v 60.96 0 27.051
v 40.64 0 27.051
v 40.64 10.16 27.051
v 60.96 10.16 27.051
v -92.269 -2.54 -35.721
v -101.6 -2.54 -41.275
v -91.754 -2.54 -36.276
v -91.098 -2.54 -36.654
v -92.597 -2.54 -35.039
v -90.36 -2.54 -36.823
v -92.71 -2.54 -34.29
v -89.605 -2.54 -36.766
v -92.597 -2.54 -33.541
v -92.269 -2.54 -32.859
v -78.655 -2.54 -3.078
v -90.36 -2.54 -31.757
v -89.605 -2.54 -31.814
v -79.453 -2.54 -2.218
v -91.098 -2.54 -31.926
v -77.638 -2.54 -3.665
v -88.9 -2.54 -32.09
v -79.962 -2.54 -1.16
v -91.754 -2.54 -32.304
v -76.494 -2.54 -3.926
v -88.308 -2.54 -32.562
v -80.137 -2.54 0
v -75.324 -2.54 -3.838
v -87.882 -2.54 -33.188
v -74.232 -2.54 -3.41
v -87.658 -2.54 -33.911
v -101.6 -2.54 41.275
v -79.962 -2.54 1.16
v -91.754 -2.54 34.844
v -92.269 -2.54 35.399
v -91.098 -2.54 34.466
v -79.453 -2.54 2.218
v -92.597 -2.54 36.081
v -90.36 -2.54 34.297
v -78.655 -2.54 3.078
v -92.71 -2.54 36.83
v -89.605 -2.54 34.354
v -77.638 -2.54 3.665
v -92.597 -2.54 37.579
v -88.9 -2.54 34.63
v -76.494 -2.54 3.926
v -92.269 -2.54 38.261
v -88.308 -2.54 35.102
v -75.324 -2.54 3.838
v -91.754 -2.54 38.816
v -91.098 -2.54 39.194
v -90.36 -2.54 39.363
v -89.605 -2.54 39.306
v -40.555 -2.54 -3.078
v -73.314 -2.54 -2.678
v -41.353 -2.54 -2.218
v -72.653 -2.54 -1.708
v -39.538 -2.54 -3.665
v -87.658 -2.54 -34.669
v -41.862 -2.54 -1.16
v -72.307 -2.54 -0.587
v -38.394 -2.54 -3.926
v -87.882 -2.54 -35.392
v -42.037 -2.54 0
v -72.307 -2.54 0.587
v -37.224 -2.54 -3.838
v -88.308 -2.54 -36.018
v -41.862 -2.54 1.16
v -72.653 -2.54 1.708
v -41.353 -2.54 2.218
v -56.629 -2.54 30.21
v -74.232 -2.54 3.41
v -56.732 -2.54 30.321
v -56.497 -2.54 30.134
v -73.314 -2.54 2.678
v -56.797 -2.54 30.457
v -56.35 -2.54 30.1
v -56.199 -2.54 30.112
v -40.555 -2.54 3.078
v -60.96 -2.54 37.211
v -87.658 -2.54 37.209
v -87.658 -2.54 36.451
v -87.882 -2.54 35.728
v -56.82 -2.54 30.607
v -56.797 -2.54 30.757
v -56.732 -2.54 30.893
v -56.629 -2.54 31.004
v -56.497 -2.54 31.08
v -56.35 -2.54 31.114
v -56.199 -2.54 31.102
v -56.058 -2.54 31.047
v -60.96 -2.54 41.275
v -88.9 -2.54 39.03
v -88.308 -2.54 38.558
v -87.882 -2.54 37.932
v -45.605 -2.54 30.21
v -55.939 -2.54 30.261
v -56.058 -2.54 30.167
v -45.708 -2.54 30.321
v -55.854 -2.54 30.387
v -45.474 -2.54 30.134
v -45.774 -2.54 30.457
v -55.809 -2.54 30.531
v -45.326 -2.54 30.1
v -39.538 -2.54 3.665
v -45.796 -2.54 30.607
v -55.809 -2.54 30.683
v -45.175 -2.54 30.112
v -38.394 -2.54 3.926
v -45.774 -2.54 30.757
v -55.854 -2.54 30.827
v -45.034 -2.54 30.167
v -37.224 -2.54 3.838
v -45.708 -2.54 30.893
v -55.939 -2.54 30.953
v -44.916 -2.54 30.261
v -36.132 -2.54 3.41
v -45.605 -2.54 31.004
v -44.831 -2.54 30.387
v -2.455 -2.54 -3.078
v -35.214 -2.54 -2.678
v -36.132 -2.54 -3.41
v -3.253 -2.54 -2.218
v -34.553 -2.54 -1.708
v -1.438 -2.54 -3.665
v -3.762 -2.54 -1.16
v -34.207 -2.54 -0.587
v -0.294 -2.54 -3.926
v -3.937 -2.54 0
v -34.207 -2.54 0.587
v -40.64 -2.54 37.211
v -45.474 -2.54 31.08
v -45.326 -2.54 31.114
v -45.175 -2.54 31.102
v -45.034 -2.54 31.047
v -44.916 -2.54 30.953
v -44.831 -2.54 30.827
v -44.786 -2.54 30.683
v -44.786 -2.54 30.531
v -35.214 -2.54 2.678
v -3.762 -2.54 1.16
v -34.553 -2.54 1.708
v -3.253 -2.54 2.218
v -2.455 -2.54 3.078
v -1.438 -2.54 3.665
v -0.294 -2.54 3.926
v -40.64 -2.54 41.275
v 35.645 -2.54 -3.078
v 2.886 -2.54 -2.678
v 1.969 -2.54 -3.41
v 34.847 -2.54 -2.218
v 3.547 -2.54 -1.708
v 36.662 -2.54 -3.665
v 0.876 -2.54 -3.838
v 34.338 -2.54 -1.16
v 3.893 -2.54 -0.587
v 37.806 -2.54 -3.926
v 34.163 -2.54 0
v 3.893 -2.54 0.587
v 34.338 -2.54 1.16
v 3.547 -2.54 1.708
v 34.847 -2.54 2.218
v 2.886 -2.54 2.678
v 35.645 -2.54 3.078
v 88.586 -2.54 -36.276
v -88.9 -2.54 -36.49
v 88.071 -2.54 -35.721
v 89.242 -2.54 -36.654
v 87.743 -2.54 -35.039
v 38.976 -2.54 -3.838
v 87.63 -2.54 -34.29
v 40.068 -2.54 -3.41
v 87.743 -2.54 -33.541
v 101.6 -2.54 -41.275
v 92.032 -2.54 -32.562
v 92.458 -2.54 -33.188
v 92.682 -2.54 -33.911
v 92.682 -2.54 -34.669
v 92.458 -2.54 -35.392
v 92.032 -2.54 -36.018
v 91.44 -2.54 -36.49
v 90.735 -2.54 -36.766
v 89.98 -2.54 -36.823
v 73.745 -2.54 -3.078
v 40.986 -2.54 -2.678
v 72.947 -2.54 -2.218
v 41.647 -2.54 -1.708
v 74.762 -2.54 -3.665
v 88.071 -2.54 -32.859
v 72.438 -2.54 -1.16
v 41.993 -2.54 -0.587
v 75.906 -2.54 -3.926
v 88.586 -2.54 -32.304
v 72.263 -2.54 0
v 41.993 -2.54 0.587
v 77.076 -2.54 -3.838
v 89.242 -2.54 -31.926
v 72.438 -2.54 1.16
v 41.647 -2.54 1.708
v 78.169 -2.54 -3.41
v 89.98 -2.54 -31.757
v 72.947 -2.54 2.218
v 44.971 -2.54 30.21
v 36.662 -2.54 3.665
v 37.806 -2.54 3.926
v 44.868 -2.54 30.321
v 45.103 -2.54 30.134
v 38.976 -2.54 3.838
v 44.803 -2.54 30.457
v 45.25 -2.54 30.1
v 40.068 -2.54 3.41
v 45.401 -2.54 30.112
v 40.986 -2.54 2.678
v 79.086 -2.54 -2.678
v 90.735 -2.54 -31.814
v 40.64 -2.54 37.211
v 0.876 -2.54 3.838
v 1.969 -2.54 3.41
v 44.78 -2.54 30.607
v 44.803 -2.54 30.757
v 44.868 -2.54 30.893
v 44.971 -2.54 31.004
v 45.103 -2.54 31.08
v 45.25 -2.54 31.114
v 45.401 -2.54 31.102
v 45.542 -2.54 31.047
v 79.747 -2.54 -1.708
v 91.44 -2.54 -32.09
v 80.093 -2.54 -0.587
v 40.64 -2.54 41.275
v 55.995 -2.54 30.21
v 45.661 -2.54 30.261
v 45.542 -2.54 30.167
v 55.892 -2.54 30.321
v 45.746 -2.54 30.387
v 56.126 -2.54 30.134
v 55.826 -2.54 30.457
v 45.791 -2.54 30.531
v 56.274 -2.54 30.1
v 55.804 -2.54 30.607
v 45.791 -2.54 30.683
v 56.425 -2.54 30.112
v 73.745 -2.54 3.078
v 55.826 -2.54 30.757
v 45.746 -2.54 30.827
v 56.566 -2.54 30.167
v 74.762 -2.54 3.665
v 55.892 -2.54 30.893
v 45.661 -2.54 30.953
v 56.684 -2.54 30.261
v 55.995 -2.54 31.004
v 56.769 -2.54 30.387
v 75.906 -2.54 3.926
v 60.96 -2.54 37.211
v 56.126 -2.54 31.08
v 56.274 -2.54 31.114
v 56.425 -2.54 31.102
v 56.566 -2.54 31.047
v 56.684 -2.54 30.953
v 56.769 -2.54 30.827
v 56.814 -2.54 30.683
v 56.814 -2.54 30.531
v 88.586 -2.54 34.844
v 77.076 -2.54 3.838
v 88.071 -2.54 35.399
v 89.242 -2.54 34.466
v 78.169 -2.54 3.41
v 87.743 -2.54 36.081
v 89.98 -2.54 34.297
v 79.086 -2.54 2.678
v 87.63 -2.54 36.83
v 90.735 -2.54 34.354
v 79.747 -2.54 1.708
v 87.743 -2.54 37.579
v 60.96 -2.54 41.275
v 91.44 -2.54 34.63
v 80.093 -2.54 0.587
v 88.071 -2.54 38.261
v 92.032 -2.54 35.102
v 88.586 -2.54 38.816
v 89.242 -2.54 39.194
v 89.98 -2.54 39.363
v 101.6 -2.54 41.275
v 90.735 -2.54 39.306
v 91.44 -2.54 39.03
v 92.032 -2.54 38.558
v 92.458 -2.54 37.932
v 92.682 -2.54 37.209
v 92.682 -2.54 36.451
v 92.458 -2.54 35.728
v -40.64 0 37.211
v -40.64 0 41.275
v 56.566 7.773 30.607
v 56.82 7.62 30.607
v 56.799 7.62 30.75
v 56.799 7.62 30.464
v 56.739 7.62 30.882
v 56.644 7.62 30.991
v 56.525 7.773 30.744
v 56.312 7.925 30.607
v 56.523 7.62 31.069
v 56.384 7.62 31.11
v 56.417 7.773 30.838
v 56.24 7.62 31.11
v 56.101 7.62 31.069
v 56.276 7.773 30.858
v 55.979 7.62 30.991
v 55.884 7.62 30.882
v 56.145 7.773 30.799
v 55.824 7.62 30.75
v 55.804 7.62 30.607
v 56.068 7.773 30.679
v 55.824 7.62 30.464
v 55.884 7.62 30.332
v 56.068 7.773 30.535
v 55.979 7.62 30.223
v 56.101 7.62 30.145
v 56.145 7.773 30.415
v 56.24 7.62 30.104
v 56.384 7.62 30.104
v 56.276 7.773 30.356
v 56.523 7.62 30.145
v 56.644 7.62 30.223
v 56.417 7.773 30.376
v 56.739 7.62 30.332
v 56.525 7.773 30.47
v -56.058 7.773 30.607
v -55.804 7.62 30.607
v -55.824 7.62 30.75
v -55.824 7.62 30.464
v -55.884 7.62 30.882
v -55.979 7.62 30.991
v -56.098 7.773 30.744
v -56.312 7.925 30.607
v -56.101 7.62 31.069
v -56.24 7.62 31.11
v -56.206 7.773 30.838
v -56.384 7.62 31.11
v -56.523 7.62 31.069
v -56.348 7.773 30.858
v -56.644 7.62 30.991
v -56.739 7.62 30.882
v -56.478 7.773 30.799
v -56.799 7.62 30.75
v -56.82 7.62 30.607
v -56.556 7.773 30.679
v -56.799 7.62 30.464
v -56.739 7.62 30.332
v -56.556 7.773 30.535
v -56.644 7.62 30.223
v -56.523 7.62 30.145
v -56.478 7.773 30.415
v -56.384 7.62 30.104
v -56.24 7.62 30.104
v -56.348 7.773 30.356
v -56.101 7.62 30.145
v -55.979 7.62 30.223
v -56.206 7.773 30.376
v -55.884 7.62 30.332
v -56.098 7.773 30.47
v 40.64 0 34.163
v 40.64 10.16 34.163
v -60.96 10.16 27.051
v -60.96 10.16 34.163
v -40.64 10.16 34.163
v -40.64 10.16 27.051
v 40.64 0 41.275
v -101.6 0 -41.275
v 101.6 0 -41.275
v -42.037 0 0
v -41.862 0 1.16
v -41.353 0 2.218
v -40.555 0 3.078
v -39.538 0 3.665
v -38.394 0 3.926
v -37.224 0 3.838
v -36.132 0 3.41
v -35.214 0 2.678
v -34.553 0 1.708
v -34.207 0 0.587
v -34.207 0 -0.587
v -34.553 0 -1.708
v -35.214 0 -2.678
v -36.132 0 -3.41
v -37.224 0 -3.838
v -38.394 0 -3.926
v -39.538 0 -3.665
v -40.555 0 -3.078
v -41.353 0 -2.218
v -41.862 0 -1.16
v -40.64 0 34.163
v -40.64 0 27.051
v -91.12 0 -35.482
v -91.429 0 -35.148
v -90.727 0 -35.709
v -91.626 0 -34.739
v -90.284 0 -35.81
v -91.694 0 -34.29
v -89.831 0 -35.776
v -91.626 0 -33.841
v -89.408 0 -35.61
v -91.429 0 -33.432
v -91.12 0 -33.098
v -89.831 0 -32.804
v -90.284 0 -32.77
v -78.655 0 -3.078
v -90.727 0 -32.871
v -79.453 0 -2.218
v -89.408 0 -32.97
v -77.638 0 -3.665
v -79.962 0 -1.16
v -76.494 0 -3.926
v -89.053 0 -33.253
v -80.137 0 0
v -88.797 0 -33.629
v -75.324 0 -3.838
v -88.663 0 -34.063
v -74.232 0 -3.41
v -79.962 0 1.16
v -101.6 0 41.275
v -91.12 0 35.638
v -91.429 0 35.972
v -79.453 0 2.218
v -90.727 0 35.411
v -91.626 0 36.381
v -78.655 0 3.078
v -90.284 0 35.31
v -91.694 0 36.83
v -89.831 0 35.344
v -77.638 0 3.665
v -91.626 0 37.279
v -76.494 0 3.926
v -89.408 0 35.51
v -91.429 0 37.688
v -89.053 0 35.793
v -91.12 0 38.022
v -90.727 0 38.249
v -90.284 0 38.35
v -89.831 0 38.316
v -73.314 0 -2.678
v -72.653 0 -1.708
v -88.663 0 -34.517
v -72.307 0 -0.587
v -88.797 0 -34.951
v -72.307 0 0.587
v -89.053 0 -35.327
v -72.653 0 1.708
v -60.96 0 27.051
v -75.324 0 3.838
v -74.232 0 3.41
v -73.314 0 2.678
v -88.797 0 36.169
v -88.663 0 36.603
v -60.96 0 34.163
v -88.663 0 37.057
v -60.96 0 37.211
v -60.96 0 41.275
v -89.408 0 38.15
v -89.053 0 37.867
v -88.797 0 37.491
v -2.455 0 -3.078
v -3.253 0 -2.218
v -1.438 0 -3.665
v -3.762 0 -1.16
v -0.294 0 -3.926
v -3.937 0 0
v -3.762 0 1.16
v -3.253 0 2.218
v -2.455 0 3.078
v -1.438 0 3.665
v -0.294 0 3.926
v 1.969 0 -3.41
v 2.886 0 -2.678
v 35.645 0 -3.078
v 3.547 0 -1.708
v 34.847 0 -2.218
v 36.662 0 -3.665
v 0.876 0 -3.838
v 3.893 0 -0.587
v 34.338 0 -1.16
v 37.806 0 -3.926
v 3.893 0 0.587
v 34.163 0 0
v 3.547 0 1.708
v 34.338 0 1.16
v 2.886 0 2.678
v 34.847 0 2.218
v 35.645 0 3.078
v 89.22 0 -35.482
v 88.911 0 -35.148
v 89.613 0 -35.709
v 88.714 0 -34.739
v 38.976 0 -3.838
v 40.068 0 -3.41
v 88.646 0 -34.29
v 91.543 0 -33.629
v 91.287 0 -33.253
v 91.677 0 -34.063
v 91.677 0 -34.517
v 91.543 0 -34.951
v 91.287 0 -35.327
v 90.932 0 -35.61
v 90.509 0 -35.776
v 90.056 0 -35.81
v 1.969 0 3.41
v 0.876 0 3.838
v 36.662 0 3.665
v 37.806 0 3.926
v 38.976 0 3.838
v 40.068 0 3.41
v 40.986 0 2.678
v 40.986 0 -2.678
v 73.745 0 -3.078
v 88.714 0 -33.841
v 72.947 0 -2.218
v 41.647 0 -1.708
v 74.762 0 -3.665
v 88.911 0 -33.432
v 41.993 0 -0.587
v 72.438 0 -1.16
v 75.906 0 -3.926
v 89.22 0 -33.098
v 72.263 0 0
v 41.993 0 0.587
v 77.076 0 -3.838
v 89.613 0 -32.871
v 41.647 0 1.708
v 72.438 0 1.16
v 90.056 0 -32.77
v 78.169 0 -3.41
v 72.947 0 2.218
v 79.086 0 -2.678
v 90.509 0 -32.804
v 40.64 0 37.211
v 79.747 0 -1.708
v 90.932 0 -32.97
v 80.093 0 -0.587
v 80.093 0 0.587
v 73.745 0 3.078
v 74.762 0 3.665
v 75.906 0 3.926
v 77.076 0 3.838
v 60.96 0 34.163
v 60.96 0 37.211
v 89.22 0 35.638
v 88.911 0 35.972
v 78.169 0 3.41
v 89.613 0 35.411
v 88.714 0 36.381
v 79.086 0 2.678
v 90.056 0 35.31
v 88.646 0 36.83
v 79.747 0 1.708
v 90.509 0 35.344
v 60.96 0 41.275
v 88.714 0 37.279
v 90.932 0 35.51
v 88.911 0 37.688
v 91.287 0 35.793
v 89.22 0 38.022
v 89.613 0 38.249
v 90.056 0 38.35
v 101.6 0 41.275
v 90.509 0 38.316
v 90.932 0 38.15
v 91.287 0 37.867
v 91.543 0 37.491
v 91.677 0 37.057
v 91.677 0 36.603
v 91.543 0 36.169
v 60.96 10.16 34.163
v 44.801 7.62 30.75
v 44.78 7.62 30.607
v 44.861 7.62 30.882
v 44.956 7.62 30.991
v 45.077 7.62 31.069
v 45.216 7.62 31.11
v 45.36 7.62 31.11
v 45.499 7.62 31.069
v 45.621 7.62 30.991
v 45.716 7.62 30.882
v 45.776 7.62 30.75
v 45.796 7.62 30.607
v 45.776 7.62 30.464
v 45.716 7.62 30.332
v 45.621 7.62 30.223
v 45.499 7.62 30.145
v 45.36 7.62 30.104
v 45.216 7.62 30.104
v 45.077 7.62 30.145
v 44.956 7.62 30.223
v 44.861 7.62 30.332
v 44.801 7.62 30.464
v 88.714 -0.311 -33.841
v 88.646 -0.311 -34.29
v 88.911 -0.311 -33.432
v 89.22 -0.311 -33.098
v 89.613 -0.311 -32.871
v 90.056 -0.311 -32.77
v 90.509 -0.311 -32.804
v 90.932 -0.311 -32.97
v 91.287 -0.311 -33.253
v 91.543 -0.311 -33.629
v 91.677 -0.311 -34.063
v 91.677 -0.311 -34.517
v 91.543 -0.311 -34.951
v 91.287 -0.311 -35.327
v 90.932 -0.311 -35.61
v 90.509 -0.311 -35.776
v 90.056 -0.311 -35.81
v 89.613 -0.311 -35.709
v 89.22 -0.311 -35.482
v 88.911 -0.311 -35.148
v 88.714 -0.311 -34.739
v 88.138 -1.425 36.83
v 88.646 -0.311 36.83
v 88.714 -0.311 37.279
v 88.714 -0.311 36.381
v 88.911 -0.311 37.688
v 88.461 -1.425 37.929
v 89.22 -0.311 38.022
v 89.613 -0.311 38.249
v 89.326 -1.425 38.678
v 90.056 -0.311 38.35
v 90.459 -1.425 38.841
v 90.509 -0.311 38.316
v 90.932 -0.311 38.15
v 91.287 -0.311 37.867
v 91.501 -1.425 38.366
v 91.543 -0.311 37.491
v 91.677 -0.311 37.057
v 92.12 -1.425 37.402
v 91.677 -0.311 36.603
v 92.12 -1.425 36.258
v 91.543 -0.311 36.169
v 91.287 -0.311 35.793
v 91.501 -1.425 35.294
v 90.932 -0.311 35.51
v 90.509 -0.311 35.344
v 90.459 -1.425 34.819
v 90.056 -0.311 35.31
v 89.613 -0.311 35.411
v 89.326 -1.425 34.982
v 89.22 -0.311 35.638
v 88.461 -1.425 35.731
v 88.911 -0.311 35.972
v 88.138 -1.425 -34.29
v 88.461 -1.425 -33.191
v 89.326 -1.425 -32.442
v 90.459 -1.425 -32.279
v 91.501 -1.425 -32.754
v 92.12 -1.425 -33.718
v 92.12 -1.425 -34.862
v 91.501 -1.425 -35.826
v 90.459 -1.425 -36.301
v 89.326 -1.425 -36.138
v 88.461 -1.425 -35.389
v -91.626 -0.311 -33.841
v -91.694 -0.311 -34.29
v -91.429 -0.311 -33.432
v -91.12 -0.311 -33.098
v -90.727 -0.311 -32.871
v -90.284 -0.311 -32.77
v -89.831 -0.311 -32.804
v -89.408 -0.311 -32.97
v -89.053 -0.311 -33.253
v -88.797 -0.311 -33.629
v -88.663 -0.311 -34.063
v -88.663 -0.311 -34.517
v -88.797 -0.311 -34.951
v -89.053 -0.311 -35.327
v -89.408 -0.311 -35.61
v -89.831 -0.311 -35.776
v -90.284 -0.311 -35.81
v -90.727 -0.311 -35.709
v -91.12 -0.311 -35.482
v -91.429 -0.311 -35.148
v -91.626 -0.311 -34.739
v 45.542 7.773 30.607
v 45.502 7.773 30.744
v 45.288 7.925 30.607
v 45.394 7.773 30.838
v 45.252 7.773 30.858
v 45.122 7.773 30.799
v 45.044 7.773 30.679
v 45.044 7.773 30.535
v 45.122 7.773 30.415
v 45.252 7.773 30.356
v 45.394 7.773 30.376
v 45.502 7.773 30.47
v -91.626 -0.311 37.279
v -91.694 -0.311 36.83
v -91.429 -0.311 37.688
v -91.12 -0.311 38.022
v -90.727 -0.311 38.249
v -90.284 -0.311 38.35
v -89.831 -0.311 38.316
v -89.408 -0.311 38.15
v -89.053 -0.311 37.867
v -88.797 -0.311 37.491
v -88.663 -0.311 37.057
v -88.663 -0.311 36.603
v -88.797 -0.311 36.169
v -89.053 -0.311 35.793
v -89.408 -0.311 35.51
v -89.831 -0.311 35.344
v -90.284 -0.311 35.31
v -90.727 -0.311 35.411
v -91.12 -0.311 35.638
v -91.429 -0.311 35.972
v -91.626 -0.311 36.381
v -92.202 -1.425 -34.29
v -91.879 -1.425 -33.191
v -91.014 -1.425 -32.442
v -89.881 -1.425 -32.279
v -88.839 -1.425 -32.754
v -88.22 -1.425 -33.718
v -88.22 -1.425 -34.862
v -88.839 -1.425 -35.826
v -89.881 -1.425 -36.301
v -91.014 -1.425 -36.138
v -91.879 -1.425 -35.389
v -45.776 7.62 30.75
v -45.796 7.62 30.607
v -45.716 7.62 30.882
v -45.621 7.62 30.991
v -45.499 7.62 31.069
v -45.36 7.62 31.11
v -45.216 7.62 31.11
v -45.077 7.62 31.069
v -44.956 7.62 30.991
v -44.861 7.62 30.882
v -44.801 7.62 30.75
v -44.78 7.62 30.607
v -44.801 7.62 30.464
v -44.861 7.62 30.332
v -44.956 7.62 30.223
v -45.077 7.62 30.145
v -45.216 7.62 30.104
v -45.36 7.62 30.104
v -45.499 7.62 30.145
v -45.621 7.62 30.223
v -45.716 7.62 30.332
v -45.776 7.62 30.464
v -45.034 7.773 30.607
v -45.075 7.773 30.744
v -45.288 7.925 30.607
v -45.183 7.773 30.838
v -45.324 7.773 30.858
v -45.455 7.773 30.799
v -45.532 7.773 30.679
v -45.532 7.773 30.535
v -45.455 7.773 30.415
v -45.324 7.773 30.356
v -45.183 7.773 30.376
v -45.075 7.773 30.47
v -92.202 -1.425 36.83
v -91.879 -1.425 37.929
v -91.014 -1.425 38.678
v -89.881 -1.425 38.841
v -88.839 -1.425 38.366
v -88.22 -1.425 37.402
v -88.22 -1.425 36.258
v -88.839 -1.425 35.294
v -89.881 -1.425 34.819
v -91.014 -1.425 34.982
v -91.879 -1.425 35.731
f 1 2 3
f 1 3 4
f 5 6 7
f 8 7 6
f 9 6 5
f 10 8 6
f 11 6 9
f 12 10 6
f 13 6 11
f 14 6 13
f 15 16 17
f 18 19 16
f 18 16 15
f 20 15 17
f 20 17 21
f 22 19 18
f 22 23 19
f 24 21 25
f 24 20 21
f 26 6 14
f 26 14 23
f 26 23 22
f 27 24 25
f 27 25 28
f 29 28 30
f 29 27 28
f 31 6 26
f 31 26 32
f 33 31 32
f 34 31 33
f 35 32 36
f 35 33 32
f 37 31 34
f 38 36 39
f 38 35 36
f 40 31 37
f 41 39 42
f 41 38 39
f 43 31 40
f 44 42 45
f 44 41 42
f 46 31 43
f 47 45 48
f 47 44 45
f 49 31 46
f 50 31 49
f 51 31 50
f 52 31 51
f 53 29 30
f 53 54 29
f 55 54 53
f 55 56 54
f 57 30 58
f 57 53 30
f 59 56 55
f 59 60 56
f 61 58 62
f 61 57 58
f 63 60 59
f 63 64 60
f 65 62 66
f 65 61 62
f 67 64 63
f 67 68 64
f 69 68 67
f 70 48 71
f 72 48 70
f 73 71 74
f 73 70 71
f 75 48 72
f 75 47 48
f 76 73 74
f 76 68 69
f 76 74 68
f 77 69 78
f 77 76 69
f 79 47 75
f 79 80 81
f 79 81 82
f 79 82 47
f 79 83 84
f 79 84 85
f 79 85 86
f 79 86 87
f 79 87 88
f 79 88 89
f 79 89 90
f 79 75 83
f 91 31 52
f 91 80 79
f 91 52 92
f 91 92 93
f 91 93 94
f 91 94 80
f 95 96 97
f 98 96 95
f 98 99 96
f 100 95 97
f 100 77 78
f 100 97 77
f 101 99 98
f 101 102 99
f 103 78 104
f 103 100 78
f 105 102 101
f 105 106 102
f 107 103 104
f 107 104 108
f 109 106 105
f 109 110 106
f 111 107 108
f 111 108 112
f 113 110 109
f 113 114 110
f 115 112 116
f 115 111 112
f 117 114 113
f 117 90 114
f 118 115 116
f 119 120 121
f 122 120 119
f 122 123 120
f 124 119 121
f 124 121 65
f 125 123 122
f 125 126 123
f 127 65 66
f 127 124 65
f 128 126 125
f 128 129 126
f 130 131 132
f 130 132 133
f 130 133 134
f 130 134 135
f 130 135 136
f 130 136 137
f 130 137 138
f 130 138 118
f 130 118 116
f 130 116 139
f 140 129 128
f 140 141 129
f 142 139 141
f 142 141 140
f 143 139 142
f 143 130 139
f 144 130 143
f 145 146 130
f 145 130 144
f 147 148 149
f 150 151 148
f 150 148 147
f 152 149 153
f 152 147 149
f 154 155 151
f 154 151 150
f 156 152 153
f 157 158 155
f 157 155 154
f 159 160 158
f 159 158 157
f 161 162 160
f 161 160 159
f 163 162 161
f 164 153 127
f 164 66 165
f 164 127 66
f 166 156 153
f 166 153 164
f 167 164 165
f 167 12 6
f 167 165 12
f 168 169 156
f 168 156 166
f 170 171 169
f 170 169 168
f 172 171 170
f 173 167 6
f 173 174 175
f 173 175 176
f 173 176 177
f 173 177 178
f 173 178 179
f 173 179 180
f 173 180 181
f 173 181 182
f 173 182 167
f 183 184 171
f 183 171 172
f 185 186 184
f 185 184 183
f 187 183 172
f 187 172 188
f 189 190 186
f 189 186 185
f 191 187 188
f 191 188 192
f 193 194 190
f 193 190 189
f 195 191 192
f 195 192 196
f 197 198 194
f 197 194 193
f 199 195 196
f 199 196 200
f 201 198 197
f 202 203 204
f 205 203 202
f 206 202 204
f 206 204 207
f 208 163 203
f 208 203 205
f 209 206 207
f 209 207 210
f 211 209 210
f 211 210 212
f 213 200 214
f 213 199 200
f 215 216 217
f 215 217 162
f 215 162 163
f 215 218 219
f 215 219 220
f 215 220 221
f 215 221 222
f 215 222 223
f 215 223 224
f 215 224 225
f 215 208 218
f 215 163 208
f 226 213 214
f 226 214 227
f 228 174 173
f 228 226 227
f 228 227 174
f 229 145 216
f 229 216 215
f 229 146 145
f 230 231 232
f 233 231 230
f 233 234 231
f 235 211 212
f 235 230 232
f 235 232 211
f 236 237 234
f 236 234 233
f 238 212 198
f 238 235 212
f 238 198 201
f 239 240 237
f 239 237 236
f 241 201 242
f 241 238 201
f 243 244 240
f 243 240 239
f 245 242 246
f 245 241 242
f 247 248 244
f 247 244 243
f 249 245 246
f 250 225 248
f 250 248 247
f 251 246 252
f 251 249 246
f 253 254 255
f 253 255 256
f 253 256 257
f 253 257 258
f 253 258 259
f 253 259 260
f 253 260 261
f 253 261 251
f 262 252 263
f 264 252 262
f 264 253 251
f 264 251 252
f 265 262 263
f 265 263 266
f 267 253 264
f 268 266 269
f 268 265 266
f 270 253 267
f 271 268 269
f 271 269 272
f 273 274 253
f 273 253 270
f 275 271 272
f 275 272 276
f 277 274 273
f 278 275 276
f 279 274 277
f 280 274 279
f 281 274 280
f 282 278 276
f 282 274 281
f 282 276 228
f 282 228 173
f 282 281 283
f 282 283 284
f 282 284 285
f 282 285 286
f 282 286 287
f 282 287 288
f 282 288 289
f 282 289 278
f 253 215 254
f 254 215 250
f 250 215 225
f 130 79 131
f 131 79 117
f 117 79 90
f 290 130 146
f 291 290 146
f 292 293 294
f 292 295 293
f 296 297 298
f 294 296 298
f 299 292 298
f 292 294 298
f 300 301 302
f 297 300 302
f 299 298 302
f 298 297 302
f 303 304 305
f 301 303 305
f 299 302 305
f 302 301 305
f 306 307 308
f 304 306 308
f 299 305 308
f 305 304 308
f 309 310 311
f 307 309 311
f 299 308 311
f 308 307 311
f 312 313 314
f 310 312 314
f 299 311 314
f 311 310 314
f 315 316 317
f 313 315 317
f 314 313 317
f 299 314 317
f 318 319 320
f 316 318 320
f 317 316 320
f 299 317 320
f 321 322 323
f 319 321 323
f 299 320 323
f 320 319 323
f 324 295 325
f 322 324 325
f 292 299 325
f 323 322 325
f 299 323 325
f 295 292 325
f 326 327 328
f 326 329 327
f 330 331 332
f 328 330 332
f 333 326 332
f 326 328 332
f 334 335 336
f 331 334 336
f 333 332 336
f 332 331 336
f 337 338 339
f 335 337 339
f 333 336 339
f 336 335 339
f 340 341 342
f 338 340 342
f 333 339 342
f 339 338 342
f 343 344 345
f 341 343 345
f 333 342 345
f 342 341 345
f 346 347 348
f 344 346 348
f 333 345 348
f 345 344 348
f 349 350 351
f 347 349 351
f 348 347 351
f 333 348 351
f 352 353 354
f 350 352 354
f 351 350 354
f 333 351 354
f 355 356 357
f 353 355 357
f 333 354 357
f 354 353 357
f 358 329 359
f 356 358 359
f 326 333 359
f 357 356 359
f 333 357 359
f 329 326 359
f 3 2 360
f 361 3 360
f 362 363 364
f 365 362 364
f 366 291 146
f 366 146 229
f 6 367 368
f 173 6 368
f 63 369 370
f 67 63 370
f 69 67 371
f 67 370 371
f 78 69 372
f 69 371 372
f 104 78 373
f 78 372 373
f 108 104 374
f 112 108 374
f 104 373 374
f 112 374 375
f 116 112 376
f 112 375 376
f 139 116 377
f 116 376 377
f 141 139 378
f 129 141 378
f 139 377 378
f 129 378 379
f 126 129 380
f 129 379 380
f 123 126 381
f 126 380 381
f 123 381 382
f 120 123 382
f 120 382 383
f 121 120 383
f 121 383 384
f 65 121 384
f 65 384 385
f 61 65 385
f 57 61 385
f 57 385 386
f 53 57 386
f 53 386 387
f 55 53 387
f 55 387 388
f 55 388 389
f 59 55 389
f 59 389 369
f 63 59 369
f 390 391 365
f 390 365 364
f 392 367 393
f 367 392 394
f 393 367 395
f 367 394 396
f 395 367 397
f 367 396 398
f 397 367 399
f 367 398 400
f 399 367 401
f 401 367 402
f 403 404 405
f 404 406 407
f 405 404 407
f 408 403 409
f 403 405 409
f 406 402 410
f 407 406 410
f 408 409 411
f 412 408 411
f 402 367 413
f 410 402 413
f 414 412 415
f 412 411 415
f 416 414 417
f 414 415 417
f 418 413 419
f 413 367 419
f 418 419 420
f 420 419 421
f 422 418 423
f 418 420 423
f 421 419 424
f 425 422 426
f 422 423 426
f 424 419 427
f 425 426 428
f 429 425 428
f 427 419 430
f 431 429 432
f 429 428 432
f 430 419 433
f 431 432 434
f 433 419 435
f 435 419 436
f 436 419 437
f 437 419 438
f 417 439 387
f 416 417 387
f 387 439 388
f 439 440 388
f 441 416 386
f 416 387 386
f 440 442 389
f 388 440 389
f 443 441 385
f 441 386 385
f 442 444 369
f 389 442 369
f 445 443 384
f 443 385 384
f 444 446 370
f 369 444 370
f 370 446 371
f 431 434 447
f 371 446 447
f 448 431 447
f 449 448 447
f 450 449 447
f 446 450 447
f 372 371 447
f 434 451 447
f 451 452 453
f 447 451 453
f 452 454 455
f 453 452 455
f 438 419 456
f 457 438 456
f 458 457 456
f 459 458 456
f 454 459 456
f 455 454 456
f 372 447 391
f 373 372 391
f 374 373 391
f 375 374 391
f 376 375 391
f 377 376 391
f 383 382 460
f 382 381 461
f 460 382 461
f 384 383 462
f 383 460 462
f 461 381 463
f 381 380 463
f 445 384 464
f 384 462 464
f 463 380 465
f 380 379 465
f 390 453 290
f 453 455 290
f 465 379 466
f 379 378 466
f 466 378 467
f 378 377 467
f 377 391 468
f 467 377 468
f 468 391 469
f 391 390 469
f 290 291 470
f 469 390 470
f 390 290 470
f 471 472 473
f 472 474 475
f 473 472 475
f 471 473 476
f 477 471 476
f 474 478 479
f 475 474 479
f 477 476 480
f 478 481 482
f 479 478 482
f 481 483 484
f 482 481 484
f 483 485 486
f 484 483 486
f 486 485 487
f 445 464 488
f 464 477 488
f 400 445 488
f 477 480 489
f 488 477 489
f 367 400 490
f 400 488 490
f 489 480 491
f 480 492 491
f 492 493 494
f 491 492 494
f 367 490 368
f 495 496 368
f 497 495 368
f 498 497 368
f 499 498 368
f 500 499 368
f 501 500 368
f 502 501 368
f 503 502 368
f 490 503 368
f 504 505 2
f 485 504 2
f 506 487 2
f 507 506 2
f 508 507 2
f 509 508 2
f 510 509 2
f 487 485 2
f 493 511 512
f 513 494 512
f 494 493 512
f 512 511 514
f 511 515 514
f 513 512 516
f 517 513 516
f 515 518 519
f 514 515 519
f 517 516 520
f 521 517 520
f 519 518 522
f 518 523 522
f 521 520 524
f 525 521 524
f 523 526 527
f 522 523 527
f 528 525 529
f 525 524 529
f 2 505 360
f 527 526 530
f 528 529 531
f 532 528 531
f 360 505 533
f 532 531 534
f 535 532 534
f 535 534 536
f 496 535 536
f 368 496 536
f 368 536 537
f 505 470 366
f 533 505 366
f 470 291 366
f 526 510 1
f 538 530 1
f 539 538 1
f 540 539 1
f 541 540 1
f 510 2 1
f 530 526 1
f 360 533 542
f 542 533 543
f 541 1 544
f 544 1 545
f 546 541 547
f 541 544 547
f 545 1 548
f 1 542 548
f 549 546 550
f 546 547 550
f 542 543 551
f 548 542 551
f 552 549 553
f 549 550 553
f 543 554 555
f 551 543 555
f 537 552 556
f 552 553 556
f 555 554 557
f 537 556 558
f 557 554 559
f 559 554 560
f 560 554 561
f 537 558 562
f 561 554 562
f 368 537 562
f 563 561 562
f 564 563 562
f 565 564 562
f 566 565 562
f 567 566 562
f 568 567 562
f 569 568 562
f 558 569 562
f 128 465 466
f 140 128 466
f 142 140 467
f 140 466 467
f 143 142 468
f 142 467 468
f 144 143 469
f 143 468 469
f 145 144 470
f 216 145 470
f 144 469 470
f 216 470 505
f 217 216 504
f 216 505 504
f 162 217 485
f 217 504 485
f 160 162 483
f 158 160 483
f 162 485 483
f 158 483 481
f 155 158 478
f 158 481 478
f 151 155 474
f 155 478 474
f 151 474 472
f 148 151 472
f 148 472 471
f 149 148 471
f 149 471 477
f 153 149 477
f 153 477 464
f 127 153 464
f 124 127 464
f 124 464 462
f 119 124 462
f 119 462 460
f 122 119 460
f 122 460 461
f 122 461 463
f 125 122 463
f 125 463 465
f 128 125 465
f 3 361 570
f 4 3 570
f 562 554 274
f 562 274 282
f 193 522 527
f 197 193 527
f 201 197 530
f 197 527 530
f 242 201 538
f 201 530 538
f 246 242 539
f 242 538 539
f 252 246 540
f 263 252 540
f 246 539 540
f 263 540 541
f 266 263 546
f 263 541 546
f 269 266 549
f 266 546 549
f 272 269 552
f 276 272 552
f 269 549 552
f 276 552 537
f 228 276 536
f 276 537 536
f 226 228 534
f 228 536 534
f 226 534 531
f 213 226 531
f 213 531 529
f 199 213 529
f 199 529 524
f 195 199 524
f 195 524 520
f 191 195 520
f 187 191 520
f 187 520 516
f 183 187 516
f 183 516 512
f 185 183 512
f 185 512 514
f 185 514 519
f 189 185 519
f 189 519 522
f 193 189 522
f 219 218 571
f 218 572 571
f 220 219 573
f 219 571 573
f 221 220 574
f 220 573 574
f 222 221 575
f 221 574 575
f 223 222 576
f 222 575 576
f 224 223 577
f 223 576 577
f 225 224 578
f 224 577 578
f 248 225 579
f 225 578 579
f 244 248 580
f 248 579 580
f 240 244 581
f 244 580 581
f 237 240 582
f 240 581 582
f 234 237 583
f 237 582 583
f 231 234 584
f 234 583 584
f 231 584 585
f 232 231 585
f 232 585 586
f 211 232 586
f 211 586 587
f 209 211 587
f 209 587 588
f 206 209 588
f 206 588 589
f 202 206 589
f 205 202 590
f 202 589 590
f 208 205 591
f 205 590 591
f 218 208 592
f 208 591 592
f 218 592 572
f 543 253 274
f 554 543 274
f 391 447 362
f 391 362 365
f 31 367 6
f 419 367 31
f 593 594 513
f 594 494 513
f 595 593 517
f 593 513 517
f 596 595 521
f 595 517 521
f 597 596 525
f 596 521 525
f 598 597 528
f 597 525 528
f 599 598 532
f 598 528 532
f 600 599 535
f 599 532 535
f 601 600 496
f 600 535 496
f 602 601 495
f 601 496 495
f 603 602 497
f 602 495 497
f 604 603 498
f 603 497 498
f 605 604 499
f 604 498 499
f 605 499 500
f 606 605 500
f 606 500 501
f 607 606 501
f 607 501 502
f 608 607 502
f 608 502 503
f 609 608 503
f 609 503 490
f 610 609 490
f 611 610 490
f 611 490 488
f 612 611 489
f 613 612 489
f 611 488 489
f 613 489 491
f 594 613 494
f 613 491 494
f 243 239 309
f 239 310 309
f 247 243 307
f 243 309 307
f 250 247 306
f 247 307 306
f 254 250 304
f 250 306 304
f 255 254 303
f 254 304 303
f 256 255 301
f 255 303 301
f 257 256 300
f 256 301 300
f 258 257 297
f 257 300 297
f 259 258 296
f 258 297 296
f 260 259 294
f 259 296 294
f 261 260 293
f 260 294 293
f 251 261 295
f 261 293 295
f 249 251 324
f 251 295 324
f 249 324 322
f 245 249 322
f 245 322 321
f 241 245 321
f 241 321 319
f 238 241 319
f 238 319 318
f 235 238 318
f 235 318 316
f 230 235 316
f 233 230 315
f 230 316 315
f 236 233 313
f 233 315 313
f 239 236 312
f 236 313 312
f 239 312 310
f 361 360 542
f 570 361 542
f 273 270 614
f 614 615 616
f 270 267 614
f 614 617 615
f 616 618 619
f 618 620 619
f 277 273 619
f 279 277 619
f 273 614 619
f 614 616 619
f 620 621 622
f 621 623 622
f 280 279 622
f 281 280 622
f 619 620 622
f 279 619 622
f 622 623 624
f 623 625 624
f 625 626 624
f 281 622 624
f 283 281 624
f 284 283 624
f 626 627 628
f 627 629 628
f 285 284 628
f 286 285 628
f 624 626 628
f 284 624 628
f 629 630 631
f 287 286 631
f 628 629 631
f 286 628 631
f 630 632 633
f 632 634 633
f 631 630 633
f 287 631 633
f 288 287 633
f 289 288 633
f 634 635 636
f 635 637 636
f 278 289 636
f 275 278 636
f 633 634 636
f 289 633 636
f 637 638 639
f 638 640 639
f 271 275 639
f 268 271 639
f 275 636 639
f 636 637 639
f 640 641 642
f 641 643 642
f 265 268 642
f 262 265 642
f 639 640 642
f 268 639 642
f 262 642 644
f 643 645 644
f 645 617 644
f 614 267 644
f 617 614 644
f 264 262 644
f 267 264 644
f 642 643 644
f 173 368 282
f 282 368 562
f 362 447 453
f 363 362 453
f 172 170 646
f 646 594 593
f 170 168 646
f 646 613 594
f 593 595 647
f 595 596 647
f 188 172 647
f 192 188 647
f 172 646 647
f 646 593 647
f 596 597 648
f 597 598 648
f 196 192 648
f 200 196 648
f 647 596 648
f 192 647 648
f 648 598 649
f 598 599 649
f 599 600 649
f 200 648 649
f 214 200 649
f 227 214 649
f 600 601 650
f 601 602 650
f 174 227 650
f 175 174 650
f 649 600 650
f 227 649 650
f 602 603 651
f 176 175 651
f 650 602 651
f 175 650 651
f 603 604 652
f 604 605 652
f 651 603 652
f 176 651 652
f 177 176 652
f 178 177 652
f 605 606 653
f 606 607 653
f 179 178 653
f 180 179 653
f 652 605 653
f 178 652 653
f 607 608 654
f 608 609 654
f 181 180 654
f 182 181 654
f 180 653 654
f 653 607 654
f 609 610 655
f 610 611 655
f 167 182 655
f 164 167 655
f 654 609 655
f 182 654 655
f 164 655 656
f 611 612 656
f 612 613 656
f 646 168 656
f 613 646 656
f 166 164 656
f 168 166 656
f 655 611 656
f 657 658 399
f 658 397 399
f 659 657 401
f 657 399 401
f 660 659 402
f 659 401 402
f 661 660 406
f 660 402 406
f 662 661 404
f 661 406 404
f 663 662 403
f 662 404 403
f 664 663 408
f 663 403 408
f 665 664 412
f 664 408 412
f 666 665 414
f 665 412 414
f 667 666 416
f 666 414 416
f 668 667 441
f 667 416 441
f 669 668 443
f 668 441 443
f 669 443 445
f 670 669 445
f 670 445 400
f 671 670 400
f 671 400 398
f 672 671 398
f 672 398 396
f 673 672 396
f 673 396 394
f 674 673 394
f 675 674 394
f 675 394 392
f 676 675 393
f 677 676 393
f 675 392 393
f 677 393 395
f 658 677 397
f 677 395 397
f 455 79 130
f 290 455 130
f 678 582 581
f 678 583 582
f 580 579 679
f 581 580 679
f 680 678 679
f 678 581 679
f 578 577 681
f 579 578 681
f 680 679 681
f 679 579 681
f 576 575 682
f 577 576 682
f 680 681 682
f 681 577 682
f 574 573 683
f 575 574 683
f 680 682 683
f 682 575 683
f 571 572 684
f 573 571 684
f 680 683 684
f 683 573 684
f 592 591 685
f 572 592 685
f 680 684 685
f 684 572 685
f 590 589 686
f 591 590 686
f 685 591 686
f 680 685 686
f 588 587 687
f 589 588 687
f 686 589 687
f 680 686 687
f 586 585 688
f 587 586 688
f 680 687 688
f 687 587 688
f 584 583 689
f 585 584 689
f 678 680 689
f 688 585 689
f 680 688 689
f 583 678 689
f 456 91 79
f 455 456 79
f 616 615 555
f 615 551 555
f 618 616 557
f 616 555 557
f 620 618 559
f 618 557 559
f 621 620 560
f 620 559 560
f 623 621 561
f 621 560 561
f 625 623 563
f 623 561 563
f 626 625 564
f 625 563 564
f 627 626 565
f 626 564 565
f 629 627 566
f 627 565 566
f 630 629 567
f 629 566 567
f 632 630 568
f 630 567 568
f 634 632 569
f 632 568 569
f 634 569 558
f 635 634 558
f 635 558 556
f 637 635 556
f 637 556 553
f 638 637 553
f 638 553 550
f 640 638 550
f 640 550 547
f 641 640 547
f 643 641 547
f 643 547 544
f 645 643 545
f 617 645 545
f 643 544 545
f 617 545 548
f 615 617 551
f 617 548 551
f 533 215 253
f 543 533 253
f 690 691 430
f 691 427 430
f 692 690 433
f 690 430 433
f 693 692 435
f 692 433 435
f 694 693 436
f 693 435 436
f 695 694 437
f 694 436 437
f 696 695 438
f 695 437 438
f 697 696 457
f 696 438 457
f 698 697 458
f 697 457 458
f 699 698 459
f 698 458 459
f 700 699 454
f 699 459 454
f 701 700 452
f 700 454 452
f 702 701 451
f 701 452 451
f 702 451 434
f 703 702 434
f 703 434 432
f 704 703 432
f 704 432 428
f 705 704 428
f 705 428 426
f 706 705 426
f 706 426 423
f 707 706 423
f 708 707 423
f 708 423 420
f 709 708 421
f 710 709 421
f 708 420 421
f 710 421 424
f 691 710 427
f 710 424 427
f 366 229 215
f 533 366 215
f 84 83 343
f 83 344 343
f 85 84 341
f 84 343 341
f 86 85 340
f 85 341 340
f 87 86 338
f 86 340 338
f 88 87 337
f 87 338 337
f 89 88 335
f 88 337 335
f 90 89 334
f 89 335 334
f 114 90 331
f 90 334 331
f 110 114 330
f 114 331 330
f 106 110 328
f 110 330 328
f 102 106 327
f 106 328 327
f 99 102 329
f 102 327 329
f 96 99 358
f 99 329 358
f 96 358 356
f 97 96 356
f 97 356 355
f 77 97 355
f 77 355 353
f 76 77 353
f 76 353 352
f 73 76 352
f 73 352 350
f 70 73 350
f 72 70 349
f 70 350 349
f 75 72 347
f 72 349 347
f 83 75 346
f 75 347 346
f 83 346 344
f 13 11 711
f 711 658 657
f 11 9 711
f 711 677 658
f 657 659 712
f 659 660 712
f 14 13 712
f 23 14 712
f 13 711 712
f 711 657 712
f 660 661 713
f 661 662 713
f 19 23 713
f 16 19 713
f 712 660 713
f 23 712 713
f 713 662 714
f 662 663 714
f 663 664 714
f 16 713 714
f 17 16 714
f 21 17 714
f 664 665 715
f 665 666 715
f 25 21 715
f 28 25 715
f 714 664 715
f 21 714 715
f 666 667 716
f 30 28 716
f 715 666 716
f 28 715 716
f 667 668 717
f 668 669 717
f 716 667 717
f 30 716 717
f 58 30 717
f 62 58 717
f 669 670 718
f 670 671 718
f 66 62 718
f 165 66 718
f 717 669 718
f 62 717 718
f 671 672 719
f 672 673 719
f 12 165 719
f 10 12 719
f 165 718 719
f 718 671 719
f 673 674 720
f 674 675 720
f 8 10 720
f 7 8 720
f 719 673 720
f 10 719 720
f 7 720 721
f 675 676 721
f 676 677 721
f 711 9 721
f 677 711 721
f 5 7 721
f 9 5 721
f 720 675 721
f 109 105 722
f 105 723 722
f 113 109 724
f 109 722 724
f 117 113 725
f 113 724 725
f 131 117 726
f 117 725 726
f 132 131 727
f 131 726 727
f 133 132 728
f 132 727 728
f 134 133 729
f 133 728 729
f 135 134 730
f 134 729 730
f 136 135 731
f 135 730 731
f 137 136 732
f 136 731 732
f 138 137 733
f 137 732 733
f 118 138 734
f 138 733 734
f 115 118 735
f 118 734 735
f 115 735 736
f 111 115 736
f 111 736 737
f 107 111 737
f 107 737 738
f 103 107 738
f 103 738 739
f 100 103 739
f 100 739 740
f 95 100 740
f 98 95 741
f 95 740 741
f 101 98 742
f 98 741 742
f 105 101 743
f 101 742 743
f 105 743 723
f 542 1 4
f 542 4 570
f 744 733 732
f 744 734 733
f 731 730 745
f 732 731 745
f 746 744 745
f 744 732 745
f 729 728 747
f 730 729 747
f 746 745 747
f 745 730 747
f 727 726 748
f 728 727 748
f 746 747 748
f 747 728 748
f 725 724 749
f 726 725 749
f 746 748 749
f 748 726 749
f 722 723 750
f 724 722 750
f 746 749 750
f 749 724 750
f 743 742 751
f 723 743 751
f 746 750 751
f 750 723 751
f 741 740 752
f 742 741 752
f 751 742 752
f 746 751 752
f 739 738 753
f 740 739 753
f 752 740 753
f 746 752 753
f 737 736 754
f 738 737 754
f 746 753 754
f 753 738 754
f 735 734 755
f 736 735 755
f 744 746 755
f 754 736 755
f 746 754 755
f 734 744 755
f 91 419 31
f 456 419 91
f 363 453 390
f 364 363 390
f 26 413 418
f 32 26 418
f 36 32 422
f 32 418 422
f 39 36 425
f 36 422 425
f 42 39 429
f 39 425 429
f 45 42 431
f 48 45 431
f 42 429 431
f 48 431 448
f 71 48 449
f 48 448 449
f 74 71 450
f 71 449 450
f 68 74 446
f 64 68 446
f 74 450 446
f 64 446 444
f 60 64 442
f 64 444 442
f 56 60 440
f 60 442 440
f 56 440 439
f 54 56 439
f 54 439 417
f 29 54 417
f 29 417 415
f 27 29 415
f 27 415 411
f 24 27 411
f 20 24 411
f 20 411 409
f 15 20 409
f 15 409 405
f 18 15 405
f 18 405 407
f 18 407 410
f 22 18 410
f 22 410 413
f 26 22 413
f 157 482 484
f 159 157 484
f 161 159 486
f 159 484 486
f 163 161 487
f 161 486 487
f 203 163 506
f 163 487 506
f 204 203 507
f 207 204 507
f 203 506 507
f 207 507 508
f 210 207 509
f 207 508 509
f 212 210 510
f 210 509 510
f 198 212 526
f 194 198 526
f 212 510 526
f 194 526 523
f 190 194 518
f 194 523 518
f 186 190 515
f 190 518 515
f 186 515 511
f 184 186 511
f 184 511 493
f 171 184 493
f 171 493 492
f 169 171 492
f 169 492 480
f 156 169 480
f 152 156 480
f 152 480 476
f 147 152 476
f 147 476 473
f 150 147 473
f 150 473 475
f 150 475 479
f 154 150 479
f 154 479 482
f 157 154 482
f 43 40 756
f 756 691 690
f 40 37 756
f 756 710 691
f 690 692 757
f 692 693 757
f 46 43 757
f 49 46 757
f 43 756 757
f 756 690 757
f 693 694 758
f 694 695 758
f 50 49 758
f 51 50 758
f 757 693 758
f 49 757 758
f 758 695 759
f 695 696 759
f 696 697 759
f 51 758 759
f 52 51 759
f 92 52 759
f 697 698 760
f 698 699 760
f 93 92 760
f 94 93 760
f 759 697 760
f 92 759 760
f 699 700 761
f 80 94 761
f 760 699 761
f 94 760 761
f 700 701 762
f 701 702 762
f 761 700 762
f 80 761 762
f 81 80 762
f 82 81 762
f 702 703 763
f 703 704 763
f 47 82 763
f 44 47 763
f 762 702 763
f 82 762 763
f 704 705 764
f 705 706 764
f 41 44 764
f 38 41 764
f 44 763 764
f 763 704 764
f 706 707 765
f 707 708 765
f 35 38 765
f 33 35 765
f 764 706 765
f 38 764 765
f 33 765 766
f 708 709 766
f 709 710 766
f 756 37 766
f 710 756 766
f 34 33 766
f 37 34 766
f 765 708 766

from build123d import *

# Parameters (mm, degrees)
F0_W           = 203.2
F0_H           = 82.55
F1_DEPTH       = 2.54
F3_D           = 7.874
F4_DEPTH       = 25.4
F2_W           = 20.32
F2_H           = 7.112
F5_DEPTH       = 12.7
F6_D           = 3.048
F6_CSINK_D     = 5.08
F6_CSINK_ANGLE = 49
F7_D           = 1.016
F7_DEPTH       = 10.16
F7_TIP         = 0.3052371945


with BuildPart() as f1:
    # F0 (on Front) → F1 (new body)
    with BuildSketch(Plane.XZ):
        Rectangle(F0_W, F0_H)
    extrude(amount=F1_DEPTH)

    # F3 (through all)
    with Locations(Plane.XZ.offset(2.54)):
        with Locations((-76.2, 0), (-38.1, 0), (0, 0), (38.1, 0), (76.2, 0)):
            Hole(F3_D / 2)

    # F2 (on face) → F4 (cut)
    with BuildSketch(Plane.XZ.offset(2.54)):
        Polygon((-50.8, 41.275), (-40.64, 41.275), (-40.64, 45.339), (-60.96, 45.339), (-60.96, 41.275), align=None)
        Polygon((40.64, 45.339), (40.64, 41.275), (50.8, 41.275), (60.96, 41.275), (60.96, 45.339), align=None)
        Polygon((-40.64, 37.211), (-40.64, 41.275), (-50.8, 41.275), (-60.96, 41.275), (-60.96, 37.211), align=None)
        Polygon((50.8, 41.275), (40.64, 41.275), (40.64, 37.211), (60.96, 37.211), (60.96, 41.275), align=None)
    extrude(amount=-F4_DEPTH, mode=Mode.SUBTRACT)

    # F2 (on face) → F5 (join)
    with BuildSketch(Plane.XZ.offset(2.54)):
        with Locations((-50.8, 30.607)):
            Rectangle(F2_W, F2_H)
        with Locations((50.8, 30.607)):
            Rectangle(F2_W, F2_H)
    extrude(amount=-F5_DEPTH)

    # F6 (through all)
    with Locations(Plane.XZ.offset(2.54)):
        with Locations((-90.17, 36.83), (-90.17, -34.29), (90.17, 36.83), (90.17, -34.29)):
            CounterSinkHole(F6_D / 2, F6_CSINK_D / 2, counter_sink_angle=F6_CSINK_ANGLE)

    # F7
    with Locations(Plane.XZ.offset(2.54)):
        with Locations((-56.3118, 30.607), (-45.2882, 30.607), (45.2882, 30.607), (56.3118, 30.607)):
            Hole(F7_D / 2, depth=F7_DEPTH)
            with Locations((0, 0, -(F7_DEPTH + F7_TIP / 2))):  # 118° drill point
                Cone(0, F7_D / 2, F7_TIP, mode=Mode.SUBTRACT)


solid = f1.part
